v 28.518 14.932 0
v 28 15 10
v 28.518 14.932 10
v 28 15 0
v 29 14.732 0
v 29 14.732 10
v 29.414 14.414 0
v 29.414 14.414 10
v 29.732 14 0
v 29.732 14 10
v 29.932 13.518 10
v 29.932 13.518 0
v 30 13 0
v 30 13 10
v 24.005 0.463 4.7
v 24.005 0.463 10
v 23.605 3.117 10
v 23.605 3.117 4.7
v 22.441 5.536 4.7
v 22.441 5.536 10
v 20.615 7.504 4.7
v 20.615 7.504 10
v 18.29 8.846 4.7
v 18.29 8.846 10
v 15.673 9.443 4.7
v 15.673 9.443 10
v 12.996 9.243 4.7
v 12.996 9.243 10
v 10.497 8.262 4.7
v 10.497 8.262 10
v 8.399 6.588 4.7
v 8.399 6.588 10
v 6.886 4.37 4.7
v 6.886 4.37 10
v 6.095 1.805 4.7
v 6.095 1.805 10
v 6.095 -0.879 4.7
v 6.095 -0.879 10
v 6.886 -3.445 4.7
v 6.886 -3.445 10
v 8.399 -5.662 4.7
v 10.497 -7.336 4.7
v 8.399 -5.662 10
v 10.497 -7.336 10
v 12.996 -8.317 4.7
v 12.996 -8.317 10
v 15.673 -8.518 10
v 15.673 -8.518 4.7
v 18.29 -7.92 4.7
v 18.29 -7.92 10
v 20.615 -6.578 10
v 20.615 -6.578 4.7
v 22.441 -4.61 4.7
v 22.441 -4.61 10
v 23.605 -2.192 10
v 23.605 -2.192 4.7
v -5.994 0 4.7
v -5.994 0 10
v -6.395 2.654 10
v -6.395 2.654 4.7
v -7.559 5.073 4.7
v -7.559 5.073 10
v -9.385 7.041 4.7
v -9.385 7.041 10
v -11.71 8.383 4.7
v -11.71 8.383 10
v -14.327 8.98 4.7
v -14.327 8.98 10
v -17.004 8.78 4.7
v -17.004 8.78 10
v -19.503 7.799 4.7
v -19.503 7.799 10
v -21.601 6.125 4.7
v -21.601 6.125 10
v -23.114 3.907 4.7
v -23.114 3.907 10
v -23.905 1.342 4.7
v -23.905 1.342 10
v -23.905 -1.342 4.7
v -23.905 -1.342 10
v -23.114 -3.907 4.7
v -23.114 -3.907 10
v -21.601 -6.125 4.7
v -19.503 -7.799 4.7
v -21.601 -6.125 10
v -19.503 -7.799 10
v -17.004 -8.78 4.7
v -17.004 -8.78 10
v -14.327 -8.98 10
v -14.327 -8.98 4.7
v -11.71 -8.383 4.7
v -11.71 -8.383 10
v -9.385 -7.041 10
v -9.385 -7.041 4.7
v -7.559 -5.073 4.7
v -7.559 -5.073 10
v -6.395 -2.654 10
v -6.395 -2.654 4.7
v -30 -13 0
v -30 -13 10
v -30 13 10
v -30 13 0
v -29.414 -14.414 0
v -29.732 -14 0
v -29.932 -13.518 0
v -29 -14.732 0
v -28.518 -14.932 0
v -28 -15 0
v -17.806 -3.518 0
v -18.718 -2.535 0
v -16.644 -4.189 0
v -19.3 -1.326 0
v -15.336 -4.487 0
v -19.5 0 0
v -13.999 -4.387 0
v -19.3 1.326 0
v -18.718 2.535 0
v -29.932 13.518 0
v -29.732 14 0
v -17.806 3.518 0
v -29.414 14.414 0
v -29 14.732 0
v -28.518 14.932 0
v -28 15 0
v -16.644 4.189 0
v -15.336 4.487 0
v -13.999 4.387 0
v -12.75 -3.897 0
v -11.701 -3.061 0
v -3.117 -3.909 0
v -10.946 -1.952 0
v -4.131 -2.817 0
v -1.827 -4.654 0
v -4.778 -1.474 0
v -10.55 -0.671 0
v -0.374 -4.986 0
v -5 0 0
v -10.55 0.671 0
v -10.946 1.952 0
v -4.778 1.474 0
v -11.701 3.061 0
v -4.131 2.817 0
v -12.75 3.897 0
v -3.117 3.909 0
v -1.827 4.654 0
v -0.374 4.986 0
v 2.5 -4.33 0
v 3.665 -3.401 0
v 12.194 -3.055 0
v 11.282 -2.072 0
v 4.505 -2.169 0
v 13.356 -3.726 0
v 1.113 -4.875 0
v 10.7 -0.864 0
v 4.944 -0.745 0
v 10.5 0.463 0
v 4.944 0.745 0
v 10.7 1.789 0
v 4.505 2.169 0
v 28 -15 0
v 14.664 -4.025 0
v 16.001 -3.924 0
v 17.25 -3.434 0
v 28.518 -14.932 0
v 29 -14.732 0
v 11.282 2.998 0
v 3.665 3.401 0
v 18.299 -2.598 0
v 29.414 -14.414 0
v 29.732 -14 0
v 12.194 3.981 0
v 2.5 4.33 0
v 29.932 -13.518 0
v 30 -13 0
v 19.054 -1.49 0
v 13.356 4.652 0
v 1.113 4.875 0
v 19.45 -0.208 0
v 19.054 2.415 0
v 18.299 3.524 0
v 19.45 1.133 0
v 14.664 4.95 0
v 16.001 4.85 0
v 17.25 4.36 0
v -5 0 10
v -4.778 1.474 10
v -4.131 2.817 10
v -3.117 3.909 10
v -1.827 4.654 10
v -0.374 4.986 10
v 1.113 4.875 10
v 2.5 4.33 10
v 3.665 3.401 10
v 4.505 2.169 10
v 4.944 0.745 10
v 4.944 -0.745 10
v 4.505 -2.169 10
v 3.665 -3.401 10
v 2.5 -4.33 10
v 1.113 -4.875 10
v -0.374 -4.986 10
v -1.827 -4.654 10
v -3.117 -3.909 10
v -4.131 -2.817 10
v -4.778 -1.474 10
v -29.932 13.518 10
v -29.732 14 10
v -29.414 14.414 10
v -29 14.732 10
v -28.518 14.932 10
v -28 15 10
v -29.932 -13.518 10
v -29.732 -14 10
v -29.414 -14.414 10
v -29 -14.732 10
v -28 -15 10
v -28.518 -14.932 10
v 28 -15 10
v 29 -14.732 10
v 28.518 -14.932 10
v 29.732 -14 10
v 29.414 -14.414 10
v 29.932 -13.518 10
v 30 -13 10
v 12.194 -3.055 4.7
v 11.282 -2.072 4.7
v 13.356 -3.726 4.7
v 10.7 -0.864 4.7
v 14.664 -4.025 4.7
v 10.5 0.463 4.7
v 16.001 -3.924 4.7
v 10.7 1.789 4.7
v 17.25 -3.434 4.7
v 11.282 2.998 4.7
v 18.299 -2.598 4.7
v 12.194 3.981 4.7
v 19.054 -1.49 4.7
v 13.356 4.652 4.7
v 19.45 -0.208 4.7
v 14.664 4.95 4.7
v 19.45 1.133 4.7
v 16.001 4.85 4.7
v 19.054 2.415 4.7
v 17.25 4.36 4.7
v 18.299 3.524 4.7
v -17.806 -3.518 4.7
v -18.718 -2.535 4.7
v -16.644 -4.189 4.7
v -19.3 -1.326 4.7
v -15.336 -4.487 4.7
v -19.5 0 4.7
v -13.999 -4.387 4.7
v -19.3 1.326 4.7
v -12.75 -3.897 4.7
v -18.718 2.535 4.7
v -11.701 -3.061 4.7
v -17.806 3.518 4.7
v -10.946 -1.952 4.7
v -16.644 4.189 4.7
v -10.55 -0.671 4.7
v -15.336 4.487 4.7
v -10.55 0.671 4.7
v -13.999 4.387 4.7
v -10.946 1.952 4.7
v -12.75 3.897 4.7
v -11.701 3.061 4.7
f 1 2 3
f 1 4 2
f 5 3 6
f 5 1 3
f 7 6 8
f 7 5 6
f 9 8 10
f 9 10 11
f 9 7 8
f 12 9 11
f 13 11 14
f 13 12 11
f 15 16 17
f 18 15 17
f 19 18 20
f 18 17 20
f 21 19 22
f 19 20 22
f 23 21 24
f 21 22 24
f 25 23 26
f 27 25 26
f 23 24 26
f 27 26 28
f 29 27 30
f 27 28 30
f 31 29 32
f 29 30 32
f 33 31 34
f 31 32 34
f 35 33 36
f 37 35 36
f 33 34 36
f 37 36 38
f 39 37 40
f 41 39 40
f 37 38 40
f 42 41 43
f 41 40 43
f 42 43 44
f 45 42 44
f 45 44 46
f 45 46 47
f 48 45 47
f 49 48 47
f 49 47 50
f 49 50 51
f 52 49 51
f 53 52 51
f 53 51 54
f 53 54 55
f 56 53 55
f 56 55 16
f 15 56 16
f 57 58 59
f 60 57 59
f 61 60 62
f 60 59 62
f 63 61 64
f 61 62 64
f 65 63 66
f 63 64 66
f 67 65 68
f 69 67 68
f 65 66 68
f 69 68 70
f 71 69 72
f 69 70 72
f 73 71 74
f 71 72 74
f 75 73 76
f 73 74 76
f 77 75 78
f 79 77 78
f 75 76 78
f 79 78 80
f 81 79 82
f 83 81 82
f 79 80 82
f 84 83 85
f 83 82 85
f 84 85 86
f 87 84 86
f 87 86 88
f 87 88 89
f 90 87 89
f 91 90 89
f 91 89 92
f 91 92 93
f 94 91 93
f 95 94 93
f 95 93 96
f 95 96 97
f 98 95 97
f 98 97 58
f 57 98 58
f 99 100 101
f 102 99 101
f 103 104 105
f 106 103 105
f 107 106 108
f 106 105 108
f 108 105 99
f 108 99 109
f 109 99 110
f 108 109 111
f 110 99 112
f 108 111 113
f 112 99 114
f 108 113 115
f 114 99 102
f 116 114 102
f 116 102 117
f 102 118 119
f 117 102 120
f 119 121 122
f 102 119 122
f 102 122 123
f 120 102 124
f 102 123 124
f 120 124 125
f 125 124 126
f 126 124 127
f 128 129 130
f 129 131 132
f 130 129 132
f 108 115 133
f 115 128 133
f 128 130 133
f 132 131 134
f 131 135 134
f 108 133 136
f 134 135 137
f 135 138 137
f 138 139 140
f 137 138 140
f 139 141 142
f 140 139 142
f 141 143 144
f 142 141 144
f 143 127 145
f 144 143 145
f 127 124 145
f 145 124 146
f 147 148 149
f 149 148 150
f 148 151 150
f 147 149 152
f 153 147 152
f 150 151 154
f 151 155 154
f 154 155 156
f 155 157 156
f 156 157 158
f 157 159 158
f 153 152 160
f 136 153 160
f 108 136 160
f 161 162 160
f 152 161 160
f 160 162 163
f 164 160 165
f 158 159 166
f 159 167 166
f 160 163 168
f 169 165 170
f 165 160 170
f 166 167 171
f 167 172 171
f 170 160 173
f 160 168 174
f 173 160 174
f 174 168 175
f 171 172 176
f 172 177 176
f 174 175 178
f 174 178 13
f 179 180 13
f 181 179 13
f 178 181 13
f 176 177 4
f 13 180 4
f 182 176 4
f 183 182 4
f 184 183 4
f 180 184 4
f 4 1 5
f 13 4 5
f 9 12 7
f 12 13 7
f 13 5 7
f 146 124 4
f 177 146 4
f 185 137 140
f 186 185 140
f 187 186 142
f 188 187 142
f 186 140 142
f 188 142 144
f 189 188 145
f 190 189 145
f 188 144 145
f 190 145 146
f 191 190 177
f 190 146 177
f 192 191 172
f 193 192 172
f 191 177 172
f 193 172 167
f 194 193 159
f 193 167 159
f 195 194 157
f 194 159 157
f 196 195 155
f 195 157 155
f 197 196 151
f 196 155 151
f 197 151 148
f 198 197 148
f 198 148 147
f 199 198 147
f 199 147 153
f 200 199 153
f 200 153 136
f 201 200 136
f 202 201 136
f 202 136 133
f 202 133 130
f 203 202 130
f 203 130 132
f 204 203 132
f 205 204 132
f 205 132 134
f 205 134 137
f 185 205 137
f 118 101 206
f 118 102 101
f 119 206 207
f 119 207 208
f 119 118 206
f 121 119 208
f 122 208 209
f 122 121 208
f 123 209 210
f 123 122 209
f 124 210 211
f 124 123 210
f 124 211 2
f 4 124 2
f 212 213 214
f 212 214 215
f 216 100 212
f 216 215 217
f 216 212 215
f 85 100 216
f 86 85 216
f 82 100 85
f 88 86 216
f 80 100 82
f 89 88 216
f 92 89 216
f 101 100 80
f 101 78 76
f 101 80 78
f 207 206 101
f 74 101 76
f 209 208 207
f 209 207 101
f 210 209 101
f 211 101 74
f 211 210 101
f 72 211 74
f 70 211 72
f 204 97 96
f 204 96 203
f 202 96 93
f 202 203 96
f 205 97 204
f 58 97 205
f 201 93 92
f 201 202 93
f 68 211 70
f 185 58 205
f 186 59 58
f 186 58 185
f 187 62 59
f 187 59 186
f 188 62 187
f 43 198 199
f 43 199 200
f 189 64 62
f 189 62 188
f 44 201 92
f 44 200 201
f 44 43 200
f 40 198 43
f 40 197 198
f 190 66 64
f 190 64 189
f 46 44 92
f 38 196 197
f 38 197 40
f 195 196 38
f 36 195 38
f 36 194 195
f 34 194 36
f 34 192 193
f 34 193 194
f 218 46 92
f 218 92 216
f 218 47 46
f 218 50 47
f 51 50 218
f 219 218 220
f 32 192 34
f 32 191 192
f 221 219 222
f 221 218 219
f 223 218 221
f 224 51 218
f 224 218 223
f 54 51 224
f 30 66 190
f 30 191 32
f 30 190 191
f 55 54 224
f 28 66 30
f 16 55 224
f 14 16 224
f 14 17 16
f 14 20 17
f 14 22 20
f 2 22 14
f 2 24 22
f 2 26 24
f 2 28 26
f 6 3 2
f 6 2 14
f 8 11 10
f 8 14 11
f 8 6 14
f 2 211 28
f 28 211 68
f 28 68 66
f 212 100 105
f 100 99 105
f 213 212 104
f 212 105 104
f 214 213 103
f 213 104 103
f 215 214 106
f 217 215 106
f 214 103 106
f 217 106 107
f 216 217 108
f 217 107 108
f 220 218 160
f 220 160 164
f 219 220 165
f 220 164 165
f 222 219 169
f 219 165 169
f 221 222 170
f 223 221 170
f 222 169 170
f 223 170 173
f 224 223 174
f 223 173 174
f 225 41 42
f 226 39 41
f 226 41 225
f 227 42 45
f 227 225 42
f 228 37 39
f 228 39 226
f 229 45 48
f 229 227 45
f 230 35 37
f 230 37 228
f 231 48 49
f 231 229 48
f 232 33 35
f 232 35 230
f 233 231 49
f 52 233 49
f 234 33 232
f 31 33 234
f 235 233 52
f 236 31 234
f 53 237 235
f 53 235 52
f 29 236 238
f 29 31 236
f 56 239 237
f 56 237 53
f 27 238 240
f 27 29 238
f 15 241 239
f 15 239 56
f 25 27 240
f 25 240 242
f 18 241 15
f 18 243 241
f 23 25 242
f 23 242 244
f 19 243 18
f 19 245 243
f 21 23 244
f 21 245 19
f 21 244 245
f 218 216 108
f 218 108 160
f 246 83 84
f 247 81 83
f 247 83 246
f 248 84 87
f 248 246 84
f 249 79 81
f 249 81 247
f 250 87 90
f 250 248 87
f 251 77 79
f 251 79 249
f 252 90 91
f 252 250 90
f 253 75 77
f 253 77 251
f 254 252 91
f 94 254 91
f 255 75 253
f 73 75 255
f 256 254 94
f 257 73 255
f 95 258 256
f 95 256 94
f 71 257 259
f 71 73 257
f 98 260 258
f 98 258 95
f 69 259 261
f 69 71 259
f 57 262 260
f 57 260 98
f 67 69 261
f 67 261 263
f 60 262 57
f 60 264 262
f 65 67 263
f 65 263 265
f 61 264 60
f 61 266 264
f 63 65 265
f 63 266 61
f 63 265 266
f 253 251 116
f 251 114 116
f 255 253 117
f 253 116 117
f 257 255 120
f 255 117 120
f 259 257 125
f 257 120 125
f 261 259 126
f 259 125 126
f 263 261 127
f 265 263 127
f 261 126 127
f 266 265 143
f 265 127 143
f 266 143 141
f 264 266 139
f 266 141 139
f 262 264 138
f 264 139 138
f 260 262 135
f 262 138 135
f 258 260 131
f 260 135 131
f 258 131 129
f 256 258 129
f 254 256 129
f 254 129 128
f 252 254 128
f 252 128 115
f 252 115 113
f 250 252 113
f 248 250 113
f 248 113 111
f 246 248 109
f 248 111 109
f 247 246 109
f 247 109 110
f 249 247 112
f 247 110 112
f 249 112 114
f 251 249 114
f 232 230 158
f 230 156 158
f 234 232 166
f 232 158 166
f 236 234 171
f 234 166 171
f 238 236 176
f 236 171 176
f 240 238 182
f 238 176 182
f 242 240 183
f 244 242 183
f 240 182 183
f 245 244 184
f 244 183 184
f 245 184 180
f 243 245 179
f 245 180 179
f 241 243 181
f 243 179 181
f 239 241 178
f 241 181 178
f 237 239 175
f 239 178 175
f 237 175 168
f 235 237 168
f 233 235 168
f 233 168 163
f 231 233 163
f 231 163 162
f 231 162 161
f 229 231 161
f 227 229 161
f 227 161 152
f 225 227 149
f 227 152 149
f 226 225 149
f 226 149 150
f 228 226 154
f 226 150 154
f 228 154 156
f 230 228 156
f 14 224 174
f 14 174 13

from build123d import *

# Parameters (mm, degrees)
SKETCH1_W                               = 60
SKETCH1_H                               = 30
BOSS_EXTRUDE1_DEPTH                     = 10
F_10_0_10_DIAMETER_HOLE1_D              = 10
CBORE_FOR_M8_HEX_HEAD_BOLT1_D           = 9
CBORE_FOR_M8_HEX_HEAD_BOLT1_CBORE_D     = 18.011
CBORE_FOR_M8_HEX_HEAD_BOLT1_CBORE_DEPTH = 5.3
FILLET1_R                               = 2


with BuildPart() as part:
    # Sketch1 → Boss-Extrude1 (new body)
    with BuildSketch(Plane.XY.offset(10)):
        Rectangle(SKETCH1_W, SKETCH1_H)
    extrude(amount=-BOSS_EXTRUDE1_DEPTH)

    # Ø10.0 (10) Diameter Hole1 (through all)
    with Locations(Plane.XY.offset(10)):
        with Locations((0, 0)):
            Hole(F_10_0_10_DIAMETER_HOLE1_D / 2)

    # CBORE for M8 Hex Head Bolt1 (through all)
    with Locations(Plane.XY.offset(10)):
        with Locations((-15, 0), (15, 0.462807071)):
            CounterBoreHole(CBORE_FOR_M8_HEX_HEAD_BOLT1_D / 2, CBORE_FOR_M8_HEX_HEAD_BOLT1_CBORE_D / 2, CBORE_FOR_M8_HEX_HEAD_BOLT1_CBORE_DEPTH)

    # Fillet1
    fillet1_edges = [part.edges().sort_by_distance(p)[0] for p in [
        (30, -15, 5),
        (-30, -15, 5),
        (-30, 15, 5),
        (30, 15, 5),
    ]]
    fillet(fillet1_edges, radius=FILLET1_R)


solid = part.part
